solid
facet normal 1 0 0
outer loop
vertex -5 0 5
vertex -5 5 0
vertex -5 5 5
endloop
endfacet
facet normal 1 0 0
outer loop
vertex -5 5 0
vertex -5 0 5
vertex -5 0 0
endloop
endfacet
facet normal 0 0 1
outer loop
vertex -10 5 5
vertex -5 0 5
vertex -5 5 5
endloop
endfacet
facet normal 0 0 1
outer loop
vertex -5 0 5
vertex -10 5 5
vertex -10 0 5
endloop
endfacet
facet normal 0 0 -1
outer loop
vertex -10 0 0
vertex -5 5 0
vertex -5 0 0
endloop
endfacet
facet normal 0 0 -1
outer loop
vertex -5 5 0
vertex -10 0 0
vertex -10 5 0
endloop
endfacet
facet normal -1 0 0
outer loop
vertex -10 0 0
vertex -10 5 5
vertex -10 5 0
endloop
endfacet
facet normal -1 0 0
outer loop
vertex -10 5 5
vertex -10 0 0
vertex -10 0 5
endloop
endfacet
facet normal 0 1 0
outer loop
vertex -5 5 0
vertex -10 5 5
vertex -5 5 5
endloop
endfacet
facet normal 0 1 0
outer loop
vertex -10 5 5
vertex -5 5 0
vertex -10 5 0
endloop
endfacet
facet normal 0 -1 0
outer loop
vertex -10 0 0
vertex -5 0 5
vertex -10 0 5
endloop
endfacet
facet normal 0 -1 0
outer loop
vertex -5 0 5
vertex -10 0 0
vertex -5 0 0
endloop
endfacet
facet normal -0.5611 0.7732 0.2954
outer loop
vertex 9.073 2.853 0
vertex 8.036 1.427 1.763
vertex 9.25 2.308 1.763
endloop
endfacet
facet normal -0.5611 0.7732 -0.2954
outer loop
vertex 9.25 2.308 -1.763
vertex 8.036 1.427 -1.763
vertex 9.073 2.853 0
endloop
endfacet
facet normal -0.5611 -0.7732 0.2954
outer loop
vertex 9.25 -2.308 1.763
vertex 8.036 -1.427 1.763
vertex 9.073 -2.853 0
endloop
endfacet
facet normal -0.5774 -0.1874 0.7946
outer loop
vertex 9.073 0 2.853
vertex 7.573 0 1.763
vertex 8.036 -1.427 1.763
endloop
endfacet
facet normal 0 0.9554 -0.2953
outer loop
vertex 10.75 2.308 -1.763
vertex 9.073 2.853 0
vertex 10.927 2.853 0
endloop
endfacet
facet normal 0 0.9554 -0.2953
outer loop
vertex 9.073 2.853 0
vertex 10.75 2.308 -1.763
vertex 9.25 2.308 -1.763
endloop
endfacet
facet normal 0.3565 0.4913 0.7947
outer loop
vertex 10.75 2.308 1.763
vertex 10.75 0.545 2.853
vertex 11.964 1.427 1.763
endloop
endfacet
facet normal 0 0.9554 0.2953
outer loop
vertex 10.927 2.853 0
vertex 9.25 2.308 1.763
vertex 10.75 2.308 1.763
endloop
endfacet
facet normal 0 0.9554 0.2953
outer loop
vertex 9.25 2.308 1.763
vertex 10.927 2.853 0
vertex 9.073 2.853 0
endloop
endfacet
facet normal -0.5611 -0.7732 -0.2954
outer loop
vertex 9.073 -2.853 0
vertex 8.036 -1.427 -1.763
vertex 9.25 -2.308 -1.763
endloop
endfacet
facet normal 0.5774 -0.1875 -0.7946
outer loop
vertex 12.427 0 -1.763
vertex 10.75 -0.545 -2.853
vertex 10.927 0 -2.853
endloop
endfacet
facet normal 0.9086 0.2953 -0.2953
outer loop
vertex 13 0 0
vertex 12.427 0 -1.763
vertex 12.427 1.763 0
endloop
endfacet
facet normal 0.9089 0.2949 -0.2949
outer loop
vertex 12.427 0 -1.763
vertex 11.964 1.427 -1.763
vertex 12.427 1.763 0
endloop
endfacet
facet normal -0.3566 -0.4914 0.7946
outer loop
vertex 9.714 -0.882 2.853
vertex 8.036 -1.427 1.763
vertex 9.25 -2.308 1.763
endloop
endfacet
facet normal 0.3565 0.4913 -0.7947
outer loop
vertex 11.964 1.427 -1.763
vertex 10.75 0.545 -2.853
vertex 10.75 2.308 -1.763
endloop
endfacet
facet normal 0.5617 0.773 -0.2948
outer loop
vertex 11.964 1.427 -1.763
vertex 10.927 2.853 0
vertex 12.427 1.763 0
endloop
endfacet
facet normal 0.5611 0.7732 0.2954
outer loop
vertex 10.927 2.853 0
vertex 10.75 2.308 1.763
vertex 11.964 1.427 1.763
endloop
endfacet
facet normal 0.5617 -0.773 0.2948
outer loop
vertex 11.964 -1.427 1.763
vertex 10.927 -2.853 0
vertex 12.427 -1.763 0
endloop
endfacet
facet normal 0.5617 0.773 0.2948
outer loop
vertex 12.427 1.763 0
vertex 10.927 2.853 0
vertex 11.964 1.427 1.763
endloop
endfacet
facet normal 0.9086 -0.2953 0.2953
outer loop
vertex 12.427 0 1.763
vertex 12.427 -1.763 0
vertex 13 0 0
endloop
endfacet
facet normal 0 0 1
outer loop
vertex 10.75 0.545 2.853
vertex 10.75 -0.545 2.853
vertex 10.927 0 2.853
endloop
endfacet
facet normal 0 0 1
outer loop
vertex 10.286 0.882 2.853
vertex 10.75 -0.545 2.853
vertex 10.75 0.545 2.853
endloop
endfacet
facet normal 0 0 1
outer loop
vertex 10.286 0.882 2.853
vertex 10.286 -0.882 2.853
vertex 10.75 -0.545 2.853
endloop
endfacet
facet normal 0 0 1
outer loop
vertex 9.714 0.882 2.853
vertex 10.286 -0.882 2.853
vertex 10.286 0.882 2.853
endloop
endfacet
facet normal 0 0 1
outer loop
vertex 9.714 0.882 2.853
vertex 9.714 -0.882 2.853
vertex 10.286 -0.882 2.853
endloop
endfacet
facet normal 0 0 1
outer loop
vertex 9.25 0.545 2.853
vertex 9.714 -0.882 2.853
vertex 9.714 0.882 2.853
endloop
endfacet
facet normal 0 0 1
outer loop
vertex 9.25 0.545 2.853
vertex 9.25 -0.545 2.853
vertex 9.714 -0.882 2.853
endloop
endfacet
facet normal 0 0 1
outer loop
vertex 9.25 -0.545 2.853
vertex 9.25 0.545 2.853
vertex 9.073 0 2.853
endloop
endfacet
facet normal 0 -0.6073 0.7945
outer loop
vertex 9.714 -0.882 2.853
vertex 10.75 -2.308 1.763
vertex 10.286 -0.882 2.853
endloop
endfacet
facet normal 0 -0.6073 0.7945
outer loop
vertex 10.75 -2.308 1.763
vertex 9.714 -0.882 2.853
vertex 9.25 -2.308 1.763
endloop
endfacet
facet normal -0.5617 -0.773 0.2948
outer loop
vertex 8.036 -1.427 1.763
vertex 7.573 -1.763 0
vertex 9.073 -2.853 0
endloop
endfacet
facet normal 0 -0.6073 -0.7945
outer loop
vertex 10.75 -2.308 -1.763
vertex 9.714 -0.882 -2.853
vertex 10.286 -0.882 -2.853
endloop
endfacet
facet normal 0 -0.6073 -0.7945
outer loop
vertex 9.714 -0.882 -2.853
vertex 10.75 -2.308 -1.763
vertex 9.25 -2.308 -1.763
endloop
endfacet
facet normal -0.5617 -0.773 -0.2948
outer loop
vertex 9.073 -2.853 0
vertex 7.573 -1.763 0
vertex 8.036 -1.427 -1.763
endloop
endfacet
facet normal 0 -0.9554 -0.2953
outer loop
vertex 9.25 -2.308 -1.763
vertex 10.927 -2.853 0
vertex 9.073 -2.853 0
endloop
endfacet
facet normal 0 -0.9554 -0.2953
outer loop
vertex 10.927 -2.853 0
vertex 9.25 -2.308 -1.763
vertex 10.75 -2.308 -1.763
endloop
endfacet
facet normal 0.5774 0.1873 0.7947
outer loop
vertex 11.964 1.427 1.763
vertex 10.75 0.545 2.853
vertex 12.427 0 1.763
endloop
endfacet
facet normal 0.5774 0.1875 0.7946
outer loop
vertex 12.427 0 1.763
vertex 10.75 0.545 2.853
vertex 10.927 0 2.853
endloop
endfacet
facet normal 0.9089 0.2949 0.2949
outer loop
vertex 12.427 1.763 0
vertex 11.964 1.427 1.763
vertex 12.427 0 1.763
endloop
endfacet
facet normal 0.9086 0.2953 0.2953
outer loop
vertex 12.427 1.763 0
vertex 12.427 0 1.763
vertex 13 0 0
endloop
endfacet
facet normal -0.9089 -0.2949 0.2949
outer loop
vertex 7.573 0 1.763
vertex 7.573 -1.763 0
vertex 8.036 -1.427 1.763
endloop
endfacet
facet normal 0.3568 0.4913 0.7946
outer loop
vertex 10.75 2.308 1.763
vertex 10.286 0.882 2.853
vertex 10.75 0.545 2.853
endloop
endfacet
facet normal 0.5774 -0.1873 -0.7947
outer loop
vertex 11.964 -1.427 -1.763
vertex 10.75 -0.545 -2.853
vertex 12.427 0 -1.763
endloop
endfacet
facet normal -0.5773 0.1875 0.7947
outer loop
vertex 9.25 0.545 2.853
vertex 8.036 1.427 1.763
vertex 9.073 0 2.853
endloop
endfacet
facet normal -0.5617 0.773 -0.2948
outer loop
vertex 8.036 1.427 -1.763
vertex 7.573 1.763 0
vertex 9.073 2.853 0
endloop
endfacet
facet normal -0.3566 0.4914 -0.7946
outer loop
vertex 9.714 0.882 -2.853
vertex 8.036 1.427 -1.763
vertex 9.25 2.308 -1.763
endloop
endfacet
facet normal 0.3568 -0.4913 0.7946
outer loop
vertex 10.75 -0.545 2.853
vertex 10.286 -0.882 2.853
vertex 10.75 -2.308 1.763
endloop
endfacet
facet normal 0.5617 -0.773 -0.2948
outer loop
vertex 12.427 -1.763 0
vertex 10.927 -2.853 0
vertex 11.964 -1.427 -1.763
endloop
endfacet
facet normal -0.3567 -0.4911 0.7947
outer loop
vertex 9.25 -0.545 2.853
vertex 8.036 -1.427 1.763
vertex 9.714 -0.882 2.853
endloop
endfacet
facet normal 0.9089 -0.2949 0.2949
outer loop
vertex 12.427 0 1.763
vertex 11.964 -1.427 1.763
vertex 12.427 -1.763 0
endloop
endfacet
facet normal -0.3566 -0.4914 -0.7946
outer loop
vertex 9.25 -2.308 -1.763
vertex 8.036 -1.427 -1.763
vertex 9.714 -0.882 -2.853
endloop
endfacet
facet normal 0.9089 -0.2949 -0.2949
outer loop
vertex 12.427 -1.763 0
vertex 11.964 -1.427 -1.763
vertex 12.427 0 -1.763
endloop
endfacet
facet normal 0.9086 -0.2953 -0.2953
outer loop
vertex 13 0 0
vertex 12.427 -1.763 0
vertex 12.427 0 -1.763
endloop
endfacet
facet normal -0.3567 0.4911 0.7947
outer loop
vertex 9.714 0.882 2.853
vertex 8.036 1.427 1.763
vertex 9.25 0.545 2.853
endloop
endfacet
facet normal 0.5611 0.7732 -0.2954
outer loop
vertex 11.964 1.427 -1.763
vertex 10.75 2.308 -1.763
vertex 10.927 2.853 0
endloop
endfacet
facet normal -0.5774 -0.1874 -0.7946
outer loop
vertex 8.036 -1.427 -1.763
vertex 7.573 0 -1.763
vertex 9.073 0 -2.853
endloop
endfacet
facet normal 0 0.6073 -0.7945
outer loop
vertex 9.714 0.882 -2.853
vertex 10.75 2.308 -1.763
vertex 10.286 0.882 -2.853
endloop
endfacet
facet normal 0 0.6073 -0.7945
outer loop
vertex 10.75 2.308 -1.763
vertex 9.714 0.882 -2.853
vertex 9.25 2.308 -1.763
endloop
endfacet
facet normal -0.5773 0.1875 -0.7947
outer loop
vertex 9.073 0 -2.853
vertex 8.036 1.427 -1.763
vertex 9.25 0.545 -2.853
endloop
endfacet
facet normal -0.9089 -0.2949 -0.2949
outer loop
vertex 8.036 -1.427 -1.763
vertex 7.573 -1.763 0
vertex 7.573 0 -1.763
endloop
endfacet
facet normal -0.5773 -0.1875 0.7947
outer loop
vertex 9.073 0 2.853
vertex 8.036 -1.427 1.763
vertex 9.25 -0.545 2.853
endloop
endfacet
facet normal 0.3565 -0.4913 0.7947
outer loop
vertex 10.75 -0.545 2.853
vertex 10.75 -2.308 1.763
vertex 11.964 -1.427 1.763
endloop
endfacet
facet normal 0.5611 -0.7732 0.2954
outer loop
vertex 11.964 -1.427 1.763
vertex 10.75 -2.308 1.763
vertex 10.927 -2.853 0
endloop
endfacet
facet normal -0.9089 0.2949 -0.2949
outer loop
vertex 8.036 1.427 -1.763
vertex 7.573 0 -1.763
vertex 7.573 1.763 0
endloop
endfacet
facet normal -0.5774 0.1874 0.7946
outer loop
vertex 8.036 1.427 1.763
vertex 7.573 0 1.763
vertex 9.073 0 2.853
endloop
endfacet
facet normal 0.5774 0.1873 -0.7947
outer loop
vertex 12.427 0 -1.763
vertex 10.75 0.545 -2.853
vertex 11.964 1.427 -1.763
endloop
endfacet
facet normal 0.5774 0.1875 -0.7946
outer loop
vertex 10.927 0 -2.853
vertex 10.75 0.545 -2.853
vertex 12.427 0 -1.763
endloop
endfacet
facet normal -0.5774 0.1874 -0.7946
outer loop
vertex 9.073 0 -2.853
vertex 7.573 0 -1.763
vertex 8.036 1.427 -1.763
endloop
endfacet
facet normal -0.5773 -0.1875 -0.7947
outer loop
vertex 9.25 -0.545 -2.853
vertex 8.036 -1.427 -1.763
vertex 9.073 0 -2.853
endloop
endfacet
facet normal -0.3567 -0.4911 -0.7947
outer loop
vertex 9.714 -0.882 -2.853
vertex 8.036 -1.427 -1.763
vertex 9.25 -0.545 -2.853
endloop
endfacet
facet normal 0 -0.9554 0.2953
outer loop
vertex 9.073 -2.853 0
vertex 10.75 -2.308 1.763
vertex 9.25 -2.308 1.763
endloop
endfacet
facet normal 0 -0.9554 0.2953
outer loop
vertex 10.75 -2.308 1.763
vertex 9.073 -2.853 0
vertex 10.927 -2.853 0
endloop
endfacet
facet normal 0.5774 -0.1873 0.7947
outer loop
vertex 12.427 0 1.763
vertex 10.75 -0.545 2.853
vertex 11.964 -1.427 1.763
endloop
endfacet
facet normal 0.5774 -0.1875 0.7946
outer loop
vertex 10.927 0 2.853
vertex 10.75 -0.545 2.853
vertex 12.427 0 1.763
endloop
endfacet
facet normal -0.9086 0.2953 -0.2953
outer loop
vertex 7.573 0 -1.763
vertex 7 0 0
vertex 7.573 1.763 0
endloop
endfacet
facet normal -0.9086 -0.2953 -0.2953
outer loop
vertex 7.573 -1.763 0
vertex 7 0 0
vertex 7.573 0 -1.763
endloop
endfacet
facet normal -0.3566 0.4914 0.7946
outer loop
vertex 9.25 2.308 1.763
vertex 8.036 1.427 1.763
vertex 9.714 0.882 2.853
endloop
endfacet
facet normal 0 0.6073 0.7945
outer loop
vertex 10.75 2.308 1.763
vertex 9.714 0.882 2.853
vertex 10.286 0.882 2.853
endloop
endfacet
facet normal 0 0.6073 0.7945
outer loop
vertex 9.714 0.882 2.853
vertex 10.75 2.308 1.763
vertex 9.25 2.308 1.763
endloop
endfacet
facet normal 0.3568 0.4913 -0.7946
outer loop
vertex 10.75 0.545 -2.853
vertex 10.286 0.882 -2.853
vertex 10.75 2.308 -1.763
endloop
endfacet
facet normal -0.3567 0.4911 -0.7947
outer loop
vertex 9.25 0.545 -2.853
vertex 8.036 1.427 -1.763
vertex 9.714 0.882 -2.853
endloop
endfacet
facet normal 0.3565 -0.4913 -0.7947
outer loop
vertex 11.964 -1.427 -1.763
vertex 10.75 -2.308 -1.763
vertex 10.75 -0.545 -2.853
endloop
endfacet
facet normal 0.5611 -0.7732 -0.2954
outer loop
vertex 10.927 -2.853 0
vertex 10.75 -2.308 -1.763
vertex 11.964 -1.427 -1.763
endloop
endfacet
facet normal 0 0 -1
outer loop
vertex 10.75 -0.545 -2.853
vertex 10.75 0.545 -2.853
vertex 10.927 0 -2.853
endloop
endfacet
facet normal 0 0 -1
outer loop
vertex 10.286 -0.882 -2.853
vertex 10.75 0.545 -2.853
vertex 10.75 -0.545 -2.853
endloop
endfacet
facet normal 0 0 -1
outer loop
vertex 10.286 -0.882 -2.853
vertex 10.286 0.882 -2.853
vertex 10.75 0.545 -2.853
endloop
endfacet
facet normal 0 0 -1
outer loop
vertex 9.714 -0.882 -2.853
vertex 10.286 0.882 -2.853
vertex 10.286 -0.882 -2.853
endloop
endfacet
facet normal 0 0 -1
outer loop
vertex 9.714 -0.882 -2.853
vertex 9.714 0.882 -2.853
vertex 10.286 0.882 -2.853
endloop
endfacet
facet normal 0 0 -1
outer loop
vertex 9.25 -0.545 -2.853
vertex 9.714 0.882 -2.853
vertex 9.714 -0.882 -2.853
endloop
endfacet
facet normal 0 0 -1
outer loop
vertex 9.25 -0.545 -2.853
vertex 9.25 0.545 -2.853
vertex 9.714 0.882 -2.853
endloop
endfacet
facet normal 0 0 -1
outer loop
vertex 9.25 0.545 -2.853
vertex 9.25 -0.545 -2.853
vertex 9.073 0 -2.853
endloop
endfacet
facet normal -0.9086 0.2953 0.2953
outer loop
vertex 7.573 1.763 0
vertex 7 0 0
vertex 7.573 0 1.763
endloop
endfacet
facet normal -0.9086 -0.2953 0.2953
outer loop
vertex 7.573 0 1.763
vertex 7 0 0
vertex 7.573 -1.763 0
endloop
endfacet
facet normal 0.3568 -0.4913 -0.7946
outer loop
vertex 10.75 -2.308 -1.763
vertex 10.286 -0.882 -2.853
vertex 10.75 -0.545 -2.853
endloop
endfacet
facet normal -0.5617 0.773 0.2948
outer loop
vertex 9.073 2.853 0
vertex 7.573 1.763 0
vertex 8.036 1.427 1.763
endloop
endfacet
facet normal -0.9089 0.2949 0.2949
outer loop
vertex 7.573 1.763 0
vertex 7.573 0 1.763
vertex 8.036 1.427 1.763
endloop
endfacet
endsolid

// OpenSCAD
// BOSL-style left() and right() transforms
module left(x) {
    translate([-x, 0, 0]) children();
}

module right(x) {
    translate([x, 0, 0]) children();
}

left(10) cube(5);
right(10) sphere(3);
